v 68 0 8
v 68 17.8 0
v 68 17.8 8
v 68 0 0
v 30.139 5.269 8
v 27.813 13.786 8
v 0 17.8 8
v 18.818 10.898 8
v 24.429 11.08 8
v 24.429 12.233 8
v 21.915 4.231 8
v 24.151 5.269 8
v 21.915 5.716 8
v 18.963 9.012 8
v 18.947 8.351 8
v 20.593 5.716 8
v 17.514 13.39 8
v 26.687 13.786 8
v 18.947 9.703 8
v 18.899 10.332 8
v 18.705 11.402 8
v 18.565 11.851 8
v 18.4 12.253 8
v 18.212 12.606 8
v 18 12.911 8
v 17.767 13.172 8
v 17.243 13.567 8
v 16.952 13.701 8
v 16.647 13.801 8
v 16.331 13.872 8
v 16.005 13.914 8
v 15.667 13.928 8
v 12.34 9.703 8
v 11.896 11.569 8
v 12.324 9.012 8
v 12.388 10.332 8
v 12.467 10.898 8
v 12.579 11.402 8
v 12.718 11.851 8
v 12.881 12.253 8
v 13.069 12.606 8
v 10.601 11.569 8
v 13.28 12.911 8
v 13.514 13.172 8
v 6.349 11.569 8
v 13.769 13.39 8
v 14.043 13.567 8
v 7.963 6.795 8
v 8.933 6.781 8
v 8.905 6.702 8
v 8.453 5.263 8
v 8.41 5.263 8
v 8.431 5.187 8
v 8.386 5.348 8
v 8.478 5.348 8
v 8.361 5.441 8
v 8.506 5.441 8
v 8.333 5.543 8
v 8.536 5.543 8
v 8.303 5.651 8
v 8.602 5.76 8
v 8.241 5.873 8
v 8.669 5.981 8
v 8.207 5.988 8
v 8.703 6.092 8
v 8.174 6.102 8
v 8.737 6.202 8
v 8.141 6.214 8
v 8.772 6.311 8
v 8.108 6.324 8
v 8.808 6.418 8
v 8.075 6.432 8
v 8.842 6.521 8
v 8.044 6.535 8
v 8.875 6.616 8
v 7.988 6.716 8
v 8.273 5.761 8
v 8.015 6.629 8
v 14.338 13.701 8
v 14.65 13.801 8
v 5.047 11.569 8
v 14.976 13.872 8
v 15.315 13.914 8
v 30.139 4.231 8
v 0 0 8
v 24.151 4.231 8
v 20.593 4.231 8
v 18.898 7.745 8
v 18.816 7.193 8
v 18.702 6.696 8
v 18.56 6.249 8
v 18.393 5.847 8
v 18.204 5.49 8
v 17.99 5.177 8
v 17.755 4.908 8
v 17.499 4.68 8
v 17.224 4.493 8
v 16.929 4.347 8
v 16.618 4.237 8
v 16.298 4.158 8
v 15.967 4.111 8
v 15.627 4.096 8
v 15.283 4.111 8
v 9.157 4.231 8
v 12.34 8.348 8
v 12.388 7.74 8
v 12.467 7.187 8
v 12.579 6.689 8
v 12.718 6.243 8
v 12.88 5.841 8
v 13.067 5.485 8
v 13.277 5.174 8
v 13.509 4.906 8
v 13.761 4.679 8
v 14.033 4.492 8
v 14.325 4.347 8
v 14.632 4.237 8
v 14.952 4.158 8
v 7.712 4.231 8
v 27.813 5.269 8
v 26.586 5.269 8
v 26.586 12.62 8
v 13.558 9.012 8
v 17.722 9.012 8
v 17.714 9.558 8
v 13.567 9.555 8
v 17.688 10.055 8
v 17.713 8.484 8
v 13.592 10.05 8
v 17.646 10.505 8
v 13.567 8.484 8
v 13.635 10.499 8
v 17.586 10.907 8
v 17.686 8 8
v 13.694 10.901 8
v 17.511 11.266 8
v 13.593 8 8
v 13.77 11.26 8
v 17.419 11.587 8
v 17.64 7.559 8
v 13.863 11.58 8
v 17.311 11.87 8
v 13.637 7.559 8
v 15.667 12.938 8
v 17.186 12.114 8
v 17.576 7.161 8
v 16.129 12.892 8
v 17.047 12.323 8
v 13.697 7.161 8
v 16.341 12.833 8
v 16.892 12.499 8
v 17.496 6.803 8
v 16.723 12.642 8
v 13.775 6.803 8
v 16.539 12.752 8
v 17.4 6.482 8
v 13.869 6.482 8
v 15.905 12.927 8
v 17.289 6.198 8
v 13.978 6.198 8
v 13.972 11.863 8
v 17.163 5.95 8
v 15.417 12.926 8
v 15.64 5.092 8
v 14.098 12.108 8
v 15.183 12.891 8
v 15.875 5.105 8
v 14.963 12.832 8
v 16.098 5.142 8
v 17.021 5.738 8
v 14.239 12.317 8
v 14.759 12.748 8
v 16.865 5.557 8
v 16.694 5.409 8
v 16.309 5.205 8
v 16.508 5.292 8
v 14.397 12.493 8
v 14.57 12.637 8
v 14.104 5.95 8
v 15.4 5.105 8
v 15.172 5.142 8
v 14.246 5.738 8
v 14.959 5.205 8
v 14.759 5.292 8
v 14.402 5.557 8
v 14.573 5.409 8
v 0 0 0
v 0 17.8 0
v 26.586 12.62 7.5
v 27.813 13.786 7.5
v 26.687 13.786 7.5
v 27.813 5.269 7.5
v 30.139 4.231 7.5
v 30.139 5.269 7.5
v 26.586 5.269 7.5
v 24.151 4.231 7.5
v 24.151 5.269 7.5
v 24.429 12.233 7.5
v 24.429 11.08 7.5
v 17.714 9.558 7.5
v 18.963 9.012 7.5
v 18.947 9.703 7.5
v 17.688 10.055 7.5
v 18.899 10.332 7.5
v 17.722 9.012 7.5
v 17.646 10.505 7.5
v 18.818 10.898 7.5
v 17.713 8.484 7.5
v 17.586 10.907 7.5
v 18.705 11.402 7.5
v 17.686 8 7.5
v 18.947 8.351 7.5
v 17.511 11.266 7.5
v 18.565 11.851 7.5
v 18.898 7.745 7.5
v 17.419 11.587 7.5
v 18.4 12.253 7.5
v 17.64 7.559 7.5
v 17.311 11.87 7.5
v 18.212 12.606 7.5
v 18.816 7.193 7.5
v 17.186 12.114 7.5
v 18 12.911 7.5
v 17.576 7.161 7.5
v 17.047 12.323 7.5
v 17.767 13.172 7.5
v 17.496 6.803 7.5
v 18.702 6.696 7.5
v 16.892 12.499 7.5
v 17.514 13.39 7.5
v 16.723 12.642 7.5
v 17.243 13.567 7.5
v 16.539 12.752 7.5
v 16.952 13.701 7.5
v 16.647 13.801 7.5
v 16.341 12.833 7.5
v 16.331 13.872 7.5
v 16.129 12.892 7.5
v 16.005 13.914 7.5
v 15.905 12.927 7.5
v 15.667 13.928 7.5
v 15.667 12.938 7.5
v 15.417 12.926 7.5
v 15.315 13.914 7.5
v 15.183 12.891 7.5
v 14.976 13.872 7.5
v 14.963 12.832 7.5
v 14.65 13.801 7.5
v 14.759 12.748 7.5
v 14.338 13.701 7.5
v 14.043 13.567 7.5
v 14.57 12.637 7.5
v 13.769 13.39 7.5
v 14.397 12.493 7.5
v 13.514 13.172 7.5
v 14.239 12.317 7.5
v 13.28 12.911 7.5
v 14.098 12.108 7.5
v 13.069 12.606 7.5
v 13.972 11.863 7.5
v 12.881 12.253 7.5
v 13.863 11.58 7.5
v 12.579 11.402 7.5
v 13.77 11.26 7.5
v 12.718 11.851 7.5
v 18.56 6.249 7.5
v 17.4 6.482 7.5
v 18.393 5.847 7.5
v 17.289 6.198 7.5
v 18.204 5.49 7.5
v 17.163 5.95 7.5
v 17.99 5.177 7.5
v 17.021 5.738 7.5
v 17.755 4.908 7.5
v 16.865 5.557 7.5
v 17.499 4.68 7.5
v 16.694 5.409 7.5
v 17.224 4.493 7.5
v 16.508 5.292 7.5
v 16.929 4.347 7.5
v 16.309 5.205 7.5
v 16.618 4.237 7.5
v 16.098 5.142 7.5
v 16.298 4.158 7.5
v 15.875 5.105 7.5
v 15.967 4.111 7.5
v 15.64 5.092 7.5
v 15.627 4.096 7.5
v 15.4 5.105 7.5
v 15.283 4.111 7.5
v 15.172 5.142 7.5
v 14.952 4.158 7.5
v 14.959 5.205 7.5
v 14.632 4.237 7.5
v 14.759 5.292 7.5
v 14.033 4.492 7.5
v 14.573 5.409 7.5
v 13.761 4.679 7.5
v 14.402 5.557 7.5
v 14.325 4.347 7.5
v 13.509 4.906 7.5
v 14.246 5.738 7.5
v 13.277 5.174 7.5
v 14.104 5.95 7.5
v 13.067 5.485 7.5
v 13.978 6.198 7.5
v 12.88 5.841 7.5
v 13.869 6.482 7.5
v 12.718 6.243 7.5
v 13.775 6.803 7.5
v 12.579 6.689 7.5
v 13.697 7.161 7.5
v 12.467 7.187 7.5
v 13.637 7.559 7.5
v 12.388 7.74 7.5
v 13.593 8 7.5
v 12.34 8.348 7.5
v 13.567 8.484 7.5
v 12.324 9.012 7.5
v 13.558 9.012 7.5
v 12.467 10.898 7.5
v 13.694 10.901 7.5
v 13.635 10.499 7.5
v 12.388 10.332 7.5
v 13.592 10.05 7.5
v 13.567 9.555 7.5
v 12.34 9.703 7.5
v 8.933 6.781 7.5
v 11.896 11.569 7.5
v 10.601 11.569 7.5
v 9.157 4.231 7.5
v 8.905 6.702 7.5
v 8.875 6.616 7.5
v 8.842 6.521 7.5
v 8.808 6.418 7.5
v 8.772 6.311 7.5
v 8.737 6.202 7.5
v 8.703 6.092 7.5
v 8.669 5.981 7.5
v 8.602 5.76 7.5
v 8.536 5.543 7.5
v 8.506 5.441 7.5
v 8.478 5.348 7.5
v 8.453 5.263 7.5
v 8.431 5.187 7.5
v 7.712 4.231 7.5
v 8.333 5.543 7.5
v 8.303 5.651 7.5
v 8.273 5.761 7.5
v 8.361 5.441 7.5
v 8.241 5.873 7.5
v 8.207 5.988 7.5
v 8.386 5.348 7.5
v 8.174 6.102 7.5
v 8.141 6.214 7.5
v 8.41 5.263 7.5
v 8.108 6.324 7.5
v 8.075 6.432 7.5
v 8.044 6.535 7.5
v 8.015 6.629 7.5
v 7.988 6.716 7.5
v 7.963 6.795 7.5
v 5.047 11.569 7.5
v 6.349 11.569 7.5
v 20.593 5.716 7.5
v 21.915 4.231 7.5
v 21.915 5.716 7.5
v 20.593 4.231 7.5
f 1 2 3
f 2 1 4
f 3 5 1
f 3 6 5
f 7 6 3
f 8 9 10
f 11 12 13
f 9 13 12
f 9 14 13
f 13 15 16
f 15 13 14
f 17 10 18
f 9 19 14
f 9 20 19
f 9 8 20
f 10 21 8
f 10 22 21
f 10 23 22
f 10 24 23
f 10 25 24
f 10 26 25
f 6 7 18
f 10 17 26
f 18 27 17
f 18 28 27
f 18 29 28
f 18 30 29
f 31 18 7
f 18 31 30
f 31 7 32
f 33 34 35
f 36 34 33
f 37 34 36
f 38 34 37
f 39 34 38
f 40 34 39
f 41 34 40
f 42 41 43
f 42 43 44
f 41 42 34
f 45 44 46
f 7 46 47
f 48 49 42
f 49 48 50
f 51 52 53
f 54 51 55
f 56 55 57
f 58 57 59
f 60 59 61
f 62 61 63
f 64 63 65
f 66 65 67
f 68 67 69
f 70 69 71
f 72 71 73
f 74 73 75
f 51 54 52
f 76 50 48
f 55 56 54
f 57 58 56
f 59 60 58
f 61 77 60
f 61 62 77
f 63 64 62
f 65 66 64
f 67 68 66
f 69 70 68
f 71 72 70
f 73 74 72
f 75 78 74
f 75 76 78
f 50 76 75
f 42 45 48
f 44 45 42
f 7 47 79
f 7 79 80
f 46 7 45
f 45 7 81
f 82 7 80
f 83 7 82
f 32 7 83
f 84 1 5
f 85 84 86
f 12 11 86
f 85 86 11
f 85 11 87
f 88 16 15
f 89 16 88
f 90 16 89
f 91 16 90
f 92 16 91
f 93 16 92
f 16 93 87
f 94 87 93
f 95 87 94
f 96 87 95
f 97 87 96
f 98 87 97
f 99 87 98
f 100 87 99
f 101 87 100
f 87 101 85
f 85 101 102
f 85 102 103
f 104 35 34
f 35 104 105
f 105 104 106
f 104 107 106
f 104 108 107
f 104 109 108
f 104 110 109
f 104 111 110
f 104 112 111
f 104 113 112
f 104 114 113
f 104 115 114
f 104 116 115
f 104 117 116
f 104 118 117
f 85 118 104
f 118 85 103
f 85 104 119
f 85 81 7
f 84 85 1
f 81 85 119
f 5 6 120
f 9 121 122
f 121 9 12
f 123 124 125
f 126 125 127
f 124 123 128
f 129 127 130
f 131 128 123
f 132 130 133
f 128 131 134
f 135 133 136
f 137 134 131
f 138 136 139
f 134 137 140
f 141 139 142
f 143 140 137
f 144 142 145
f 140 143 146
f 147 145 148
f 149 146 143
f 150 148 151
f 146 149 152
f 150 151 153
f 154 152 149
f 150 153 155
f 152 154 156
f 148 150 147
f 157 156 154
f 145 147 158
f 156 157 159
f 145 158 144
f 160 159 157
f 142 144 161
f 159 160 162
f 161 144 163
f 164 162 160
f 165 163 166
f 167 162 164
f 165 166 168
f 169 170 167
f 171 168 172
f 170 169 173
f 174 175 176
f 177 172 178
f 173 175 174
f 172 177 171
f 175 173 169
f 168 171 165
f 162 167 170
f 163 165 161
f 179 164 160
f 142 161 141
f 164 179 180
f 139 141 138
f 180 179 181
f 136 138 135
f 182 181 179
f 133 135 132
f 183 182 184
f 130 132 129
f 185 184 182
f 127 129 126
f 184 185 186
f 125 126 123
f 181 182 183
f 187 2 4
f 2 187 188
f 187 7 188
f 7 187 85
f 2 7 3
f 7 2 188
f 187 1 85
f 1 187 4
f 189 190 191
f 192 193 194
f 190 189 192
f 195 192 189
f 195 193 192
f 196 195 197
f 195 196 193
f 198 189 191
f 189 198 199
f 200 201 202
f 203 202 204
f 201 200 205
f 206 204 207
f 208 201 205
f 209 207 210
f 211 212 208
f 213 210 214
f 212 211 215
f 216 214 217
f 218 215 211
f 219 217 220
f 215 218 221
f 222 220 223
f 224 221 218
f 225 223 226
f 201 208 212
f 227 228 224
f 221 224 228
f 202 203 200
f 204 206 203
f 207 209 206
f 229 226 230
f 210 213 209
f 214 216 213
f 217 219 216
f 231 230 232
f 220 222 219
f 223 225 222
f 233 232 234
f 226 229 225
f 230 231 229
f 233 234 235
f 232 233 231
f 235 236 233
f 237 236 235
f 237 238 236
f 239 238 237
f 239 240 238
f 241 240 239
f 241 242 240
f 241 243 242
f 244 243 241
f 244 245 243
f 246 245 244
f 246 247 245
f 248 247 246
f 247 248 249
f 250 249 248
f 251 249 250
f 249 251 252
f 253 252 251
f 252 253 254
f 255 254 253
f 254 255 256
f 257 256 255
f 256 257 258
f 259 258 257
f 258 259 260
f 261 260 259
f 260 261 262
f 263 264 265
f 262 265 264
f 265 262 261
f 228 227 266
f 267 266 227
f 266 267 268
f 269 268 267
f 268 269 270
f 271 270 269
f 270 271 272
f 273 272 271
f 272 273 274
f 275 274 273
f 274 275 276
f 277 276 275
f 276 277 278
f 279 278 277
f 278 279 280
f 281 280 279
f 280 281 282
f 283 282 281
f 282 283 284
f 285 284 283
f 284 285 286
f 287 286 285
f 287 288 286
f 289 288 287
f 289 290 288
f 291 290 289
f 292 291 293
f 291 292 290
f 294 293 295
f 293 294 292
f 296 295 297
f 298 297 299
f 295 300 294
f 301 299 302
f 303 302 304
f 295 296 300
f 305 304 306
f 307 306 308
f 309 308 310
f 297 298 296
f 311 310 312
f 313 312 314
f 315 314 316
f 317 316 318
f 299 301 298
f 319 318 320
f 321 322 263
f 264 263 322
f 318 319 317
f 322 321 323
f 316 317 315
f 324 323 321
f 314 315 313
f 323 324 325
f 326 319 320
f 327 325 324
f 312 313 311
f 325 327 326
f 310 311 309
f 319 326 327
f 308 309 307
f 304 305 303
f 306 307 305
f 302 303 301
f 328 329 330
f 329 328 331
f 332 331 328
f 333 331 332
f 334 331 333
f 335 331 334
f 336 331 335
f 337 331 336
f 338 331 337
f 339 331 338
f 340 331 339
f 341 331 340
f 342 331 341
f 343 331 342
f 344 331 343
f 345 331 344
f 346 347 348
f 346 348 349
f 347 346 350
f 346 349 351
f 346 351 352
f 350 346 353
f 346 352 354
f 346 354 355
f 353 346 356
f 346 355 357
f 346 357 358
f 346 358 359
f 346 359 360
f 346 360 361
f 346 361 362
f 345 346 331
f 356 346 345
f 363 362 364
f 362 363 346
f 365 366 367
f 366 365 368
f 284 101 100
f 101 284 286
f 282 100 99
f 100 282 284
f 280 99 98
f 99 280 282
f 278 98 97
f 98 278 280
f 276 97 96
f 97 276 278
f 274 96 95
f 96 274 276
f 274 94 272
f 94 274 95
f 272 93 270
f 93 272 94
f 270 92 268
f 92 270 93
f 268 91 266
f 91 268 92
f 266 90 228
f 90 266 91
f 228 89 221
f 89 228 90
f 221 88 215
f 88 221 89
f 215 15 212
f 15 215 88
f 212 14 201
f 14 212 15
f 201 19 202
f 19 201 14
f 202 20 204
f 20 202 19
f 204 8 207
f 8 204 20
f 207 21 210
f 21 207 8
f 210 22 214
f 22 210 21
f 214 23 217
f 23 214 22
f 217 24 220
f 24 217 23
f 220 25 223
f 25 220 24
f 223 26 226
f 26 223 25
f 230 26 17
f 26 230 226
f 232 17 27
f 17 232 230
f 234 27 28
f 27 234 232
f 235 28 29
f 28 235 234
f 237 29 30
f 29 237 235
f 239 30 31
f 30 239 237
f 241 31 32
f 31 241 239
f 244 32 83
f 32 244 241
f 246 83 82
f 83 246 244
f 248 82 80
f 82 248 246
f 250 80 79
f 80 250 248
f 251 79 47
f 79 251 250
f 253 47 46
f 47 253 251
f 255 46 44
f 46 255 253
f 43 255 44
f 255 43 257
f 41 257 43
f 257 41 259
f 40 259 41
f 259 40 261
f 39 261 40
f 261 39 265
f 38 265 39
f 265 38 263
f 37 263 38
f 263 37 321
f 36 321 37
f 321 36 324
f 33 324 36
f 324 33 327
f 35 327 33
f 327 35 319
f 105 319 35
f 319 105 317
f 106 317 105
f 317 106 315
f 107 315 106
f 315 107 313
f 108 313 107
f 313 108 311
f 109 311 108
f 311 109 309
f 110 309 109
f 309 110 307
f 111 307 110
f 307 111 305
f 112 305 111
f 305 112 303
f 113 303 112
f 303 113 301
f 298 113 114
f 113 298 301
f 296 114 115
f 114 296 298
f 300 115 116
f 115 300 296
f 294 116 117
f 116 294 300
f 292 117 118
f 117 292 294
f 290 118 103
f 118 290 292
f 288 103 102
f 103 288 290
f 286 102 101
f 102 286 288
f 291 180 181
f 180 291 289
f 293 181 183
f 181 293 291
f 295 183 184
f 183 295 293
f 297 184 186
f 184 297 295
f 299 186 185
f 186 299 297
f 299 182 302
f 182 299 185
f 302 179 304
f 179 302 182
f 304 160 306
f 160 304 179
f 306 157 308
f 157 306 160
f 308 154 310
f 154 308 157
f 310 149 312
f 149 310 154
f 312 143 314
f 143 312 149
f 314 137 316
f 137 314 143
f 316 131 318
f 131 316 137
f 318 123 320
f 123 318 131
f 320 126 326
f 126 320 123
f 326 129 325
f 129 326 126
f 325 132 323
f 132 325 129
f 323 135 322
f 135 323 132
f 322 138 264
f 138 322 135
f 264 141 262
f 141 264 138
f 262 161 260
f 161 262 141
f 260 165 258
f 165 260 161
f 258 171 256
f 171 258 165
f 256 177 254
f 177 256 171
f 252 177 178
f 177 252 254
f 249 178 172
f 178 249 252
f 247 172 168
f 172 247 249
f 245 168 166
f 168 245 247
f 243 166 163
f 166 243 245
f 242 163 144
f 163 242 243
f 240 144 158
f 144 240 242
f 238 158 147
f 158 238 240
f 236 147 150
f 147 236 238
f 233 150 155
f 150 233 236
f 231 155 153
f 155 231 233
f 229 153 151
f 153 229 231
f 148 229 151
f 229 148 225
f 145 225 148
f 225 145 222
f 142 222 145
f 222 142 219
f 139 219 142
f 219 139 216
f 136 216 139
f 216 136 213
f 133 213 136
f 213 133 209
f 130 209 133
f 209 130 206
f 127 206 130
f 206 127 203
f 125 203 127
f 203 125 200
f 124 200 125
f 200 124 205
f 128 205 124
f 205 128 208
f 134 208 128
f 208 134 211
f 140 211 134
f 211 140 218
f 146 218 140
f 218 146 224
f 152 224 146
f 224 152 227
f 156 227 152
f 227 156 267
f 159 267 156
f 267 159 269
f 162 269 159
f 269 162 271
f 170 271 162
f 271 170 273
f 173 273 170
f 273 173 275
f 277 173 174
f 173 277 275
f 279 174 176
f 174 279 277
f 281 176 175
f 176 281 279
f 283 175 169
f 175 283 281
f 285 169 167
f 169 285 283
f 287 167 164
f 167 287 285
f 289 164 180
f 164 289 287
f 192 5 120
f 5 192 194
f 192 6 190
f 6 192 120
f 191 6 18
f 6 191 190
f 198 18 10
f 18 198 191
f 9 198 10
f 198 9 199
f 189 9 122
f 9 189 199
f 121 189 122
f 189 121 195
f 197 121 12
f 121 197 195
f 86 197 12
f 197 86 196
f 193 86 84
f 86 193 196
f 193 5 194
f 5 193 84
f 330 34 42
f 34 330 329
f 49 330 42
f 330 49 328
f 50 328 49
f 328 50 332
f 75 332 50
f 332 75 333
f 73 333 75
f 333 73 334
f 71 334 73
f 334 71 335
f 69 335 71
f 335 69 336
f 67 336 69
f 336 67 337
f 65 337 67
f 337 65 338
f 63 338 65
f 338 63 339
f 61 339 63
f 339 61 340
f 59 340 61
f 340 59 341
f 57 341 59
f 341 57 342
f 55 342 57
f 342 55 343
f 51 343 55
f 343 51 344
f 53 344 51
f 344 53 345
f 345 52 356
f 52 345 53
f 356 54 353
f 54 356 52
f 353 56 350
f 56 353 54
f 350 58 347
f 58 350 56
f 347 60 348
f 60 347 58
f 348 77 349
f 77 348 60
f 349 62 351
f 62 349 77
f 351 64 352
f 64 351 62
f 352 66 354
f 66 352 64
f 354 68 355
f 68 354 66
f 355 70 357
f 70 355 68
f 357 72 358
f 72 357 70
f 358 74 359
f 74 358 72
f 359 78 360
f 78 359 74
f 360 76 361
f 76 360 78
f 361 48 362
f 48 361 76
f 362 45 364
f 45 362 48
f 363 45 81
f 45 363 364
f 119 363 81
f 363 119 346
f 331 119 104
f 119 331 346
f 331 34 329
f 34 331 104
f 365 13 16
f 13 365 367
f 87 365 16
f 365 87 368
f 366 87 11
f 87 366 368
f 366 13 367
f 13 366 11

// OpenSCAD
// file: include-pb3-envelope.scad
// Shared PB-3 outer envelope library. Dimensions drawn from measurement
// photos (measurements/IMG_9373.jpeg-IMG_9385.jpeg) and the Stereo2Go
// teardown cached in research/. Units: millimetres.
//
// Included by pb3-pack.scad (print-fit gauge) and pb3-fit-check.scad
// (board-STL overlay). Per ADR-004, `include-*.scad` files are libraries
// only -- they are skipped by the CI render loop.

pb3_envelope_len = 68;
pb3_envelope_width = 17.8;
pb3_envelope_height = 8;

module pb3_envelope(emboss_version=false) {
    textH = .5;
    textS = 10;
    wiggle = .01;
    if (emboss_version) {
        difference() {
            cube([pb3_envelope_len, pb3_envelope_width, pb3_envelope_height]);
            translate([textS / 2, pb3_envelope_width / 2, pb3_envelope_height - textH])
                linear_extrude(.5 + wiggle) text("v0.1", size=textS, valign="center");
        }
    } else {
        cube([pb3_envelope_len, pb3_envelope_width, pb3_envelope_height]);
    }
}
// main file
// PB-3 battery pack simplification: single solid block matching the outer
// envelope, embossed with a version marker. See include-pb3-envelope.scad
// for the shared dimensions (also used by pb3-fit-check.scad).
include <include-pb3-envelope.scad>

pb3_envelope(emboss_version=true);
// To test fitting, run OpenSCAD and export to STL. Then 3D print a test block to verify fit in the PB-3 housing.
